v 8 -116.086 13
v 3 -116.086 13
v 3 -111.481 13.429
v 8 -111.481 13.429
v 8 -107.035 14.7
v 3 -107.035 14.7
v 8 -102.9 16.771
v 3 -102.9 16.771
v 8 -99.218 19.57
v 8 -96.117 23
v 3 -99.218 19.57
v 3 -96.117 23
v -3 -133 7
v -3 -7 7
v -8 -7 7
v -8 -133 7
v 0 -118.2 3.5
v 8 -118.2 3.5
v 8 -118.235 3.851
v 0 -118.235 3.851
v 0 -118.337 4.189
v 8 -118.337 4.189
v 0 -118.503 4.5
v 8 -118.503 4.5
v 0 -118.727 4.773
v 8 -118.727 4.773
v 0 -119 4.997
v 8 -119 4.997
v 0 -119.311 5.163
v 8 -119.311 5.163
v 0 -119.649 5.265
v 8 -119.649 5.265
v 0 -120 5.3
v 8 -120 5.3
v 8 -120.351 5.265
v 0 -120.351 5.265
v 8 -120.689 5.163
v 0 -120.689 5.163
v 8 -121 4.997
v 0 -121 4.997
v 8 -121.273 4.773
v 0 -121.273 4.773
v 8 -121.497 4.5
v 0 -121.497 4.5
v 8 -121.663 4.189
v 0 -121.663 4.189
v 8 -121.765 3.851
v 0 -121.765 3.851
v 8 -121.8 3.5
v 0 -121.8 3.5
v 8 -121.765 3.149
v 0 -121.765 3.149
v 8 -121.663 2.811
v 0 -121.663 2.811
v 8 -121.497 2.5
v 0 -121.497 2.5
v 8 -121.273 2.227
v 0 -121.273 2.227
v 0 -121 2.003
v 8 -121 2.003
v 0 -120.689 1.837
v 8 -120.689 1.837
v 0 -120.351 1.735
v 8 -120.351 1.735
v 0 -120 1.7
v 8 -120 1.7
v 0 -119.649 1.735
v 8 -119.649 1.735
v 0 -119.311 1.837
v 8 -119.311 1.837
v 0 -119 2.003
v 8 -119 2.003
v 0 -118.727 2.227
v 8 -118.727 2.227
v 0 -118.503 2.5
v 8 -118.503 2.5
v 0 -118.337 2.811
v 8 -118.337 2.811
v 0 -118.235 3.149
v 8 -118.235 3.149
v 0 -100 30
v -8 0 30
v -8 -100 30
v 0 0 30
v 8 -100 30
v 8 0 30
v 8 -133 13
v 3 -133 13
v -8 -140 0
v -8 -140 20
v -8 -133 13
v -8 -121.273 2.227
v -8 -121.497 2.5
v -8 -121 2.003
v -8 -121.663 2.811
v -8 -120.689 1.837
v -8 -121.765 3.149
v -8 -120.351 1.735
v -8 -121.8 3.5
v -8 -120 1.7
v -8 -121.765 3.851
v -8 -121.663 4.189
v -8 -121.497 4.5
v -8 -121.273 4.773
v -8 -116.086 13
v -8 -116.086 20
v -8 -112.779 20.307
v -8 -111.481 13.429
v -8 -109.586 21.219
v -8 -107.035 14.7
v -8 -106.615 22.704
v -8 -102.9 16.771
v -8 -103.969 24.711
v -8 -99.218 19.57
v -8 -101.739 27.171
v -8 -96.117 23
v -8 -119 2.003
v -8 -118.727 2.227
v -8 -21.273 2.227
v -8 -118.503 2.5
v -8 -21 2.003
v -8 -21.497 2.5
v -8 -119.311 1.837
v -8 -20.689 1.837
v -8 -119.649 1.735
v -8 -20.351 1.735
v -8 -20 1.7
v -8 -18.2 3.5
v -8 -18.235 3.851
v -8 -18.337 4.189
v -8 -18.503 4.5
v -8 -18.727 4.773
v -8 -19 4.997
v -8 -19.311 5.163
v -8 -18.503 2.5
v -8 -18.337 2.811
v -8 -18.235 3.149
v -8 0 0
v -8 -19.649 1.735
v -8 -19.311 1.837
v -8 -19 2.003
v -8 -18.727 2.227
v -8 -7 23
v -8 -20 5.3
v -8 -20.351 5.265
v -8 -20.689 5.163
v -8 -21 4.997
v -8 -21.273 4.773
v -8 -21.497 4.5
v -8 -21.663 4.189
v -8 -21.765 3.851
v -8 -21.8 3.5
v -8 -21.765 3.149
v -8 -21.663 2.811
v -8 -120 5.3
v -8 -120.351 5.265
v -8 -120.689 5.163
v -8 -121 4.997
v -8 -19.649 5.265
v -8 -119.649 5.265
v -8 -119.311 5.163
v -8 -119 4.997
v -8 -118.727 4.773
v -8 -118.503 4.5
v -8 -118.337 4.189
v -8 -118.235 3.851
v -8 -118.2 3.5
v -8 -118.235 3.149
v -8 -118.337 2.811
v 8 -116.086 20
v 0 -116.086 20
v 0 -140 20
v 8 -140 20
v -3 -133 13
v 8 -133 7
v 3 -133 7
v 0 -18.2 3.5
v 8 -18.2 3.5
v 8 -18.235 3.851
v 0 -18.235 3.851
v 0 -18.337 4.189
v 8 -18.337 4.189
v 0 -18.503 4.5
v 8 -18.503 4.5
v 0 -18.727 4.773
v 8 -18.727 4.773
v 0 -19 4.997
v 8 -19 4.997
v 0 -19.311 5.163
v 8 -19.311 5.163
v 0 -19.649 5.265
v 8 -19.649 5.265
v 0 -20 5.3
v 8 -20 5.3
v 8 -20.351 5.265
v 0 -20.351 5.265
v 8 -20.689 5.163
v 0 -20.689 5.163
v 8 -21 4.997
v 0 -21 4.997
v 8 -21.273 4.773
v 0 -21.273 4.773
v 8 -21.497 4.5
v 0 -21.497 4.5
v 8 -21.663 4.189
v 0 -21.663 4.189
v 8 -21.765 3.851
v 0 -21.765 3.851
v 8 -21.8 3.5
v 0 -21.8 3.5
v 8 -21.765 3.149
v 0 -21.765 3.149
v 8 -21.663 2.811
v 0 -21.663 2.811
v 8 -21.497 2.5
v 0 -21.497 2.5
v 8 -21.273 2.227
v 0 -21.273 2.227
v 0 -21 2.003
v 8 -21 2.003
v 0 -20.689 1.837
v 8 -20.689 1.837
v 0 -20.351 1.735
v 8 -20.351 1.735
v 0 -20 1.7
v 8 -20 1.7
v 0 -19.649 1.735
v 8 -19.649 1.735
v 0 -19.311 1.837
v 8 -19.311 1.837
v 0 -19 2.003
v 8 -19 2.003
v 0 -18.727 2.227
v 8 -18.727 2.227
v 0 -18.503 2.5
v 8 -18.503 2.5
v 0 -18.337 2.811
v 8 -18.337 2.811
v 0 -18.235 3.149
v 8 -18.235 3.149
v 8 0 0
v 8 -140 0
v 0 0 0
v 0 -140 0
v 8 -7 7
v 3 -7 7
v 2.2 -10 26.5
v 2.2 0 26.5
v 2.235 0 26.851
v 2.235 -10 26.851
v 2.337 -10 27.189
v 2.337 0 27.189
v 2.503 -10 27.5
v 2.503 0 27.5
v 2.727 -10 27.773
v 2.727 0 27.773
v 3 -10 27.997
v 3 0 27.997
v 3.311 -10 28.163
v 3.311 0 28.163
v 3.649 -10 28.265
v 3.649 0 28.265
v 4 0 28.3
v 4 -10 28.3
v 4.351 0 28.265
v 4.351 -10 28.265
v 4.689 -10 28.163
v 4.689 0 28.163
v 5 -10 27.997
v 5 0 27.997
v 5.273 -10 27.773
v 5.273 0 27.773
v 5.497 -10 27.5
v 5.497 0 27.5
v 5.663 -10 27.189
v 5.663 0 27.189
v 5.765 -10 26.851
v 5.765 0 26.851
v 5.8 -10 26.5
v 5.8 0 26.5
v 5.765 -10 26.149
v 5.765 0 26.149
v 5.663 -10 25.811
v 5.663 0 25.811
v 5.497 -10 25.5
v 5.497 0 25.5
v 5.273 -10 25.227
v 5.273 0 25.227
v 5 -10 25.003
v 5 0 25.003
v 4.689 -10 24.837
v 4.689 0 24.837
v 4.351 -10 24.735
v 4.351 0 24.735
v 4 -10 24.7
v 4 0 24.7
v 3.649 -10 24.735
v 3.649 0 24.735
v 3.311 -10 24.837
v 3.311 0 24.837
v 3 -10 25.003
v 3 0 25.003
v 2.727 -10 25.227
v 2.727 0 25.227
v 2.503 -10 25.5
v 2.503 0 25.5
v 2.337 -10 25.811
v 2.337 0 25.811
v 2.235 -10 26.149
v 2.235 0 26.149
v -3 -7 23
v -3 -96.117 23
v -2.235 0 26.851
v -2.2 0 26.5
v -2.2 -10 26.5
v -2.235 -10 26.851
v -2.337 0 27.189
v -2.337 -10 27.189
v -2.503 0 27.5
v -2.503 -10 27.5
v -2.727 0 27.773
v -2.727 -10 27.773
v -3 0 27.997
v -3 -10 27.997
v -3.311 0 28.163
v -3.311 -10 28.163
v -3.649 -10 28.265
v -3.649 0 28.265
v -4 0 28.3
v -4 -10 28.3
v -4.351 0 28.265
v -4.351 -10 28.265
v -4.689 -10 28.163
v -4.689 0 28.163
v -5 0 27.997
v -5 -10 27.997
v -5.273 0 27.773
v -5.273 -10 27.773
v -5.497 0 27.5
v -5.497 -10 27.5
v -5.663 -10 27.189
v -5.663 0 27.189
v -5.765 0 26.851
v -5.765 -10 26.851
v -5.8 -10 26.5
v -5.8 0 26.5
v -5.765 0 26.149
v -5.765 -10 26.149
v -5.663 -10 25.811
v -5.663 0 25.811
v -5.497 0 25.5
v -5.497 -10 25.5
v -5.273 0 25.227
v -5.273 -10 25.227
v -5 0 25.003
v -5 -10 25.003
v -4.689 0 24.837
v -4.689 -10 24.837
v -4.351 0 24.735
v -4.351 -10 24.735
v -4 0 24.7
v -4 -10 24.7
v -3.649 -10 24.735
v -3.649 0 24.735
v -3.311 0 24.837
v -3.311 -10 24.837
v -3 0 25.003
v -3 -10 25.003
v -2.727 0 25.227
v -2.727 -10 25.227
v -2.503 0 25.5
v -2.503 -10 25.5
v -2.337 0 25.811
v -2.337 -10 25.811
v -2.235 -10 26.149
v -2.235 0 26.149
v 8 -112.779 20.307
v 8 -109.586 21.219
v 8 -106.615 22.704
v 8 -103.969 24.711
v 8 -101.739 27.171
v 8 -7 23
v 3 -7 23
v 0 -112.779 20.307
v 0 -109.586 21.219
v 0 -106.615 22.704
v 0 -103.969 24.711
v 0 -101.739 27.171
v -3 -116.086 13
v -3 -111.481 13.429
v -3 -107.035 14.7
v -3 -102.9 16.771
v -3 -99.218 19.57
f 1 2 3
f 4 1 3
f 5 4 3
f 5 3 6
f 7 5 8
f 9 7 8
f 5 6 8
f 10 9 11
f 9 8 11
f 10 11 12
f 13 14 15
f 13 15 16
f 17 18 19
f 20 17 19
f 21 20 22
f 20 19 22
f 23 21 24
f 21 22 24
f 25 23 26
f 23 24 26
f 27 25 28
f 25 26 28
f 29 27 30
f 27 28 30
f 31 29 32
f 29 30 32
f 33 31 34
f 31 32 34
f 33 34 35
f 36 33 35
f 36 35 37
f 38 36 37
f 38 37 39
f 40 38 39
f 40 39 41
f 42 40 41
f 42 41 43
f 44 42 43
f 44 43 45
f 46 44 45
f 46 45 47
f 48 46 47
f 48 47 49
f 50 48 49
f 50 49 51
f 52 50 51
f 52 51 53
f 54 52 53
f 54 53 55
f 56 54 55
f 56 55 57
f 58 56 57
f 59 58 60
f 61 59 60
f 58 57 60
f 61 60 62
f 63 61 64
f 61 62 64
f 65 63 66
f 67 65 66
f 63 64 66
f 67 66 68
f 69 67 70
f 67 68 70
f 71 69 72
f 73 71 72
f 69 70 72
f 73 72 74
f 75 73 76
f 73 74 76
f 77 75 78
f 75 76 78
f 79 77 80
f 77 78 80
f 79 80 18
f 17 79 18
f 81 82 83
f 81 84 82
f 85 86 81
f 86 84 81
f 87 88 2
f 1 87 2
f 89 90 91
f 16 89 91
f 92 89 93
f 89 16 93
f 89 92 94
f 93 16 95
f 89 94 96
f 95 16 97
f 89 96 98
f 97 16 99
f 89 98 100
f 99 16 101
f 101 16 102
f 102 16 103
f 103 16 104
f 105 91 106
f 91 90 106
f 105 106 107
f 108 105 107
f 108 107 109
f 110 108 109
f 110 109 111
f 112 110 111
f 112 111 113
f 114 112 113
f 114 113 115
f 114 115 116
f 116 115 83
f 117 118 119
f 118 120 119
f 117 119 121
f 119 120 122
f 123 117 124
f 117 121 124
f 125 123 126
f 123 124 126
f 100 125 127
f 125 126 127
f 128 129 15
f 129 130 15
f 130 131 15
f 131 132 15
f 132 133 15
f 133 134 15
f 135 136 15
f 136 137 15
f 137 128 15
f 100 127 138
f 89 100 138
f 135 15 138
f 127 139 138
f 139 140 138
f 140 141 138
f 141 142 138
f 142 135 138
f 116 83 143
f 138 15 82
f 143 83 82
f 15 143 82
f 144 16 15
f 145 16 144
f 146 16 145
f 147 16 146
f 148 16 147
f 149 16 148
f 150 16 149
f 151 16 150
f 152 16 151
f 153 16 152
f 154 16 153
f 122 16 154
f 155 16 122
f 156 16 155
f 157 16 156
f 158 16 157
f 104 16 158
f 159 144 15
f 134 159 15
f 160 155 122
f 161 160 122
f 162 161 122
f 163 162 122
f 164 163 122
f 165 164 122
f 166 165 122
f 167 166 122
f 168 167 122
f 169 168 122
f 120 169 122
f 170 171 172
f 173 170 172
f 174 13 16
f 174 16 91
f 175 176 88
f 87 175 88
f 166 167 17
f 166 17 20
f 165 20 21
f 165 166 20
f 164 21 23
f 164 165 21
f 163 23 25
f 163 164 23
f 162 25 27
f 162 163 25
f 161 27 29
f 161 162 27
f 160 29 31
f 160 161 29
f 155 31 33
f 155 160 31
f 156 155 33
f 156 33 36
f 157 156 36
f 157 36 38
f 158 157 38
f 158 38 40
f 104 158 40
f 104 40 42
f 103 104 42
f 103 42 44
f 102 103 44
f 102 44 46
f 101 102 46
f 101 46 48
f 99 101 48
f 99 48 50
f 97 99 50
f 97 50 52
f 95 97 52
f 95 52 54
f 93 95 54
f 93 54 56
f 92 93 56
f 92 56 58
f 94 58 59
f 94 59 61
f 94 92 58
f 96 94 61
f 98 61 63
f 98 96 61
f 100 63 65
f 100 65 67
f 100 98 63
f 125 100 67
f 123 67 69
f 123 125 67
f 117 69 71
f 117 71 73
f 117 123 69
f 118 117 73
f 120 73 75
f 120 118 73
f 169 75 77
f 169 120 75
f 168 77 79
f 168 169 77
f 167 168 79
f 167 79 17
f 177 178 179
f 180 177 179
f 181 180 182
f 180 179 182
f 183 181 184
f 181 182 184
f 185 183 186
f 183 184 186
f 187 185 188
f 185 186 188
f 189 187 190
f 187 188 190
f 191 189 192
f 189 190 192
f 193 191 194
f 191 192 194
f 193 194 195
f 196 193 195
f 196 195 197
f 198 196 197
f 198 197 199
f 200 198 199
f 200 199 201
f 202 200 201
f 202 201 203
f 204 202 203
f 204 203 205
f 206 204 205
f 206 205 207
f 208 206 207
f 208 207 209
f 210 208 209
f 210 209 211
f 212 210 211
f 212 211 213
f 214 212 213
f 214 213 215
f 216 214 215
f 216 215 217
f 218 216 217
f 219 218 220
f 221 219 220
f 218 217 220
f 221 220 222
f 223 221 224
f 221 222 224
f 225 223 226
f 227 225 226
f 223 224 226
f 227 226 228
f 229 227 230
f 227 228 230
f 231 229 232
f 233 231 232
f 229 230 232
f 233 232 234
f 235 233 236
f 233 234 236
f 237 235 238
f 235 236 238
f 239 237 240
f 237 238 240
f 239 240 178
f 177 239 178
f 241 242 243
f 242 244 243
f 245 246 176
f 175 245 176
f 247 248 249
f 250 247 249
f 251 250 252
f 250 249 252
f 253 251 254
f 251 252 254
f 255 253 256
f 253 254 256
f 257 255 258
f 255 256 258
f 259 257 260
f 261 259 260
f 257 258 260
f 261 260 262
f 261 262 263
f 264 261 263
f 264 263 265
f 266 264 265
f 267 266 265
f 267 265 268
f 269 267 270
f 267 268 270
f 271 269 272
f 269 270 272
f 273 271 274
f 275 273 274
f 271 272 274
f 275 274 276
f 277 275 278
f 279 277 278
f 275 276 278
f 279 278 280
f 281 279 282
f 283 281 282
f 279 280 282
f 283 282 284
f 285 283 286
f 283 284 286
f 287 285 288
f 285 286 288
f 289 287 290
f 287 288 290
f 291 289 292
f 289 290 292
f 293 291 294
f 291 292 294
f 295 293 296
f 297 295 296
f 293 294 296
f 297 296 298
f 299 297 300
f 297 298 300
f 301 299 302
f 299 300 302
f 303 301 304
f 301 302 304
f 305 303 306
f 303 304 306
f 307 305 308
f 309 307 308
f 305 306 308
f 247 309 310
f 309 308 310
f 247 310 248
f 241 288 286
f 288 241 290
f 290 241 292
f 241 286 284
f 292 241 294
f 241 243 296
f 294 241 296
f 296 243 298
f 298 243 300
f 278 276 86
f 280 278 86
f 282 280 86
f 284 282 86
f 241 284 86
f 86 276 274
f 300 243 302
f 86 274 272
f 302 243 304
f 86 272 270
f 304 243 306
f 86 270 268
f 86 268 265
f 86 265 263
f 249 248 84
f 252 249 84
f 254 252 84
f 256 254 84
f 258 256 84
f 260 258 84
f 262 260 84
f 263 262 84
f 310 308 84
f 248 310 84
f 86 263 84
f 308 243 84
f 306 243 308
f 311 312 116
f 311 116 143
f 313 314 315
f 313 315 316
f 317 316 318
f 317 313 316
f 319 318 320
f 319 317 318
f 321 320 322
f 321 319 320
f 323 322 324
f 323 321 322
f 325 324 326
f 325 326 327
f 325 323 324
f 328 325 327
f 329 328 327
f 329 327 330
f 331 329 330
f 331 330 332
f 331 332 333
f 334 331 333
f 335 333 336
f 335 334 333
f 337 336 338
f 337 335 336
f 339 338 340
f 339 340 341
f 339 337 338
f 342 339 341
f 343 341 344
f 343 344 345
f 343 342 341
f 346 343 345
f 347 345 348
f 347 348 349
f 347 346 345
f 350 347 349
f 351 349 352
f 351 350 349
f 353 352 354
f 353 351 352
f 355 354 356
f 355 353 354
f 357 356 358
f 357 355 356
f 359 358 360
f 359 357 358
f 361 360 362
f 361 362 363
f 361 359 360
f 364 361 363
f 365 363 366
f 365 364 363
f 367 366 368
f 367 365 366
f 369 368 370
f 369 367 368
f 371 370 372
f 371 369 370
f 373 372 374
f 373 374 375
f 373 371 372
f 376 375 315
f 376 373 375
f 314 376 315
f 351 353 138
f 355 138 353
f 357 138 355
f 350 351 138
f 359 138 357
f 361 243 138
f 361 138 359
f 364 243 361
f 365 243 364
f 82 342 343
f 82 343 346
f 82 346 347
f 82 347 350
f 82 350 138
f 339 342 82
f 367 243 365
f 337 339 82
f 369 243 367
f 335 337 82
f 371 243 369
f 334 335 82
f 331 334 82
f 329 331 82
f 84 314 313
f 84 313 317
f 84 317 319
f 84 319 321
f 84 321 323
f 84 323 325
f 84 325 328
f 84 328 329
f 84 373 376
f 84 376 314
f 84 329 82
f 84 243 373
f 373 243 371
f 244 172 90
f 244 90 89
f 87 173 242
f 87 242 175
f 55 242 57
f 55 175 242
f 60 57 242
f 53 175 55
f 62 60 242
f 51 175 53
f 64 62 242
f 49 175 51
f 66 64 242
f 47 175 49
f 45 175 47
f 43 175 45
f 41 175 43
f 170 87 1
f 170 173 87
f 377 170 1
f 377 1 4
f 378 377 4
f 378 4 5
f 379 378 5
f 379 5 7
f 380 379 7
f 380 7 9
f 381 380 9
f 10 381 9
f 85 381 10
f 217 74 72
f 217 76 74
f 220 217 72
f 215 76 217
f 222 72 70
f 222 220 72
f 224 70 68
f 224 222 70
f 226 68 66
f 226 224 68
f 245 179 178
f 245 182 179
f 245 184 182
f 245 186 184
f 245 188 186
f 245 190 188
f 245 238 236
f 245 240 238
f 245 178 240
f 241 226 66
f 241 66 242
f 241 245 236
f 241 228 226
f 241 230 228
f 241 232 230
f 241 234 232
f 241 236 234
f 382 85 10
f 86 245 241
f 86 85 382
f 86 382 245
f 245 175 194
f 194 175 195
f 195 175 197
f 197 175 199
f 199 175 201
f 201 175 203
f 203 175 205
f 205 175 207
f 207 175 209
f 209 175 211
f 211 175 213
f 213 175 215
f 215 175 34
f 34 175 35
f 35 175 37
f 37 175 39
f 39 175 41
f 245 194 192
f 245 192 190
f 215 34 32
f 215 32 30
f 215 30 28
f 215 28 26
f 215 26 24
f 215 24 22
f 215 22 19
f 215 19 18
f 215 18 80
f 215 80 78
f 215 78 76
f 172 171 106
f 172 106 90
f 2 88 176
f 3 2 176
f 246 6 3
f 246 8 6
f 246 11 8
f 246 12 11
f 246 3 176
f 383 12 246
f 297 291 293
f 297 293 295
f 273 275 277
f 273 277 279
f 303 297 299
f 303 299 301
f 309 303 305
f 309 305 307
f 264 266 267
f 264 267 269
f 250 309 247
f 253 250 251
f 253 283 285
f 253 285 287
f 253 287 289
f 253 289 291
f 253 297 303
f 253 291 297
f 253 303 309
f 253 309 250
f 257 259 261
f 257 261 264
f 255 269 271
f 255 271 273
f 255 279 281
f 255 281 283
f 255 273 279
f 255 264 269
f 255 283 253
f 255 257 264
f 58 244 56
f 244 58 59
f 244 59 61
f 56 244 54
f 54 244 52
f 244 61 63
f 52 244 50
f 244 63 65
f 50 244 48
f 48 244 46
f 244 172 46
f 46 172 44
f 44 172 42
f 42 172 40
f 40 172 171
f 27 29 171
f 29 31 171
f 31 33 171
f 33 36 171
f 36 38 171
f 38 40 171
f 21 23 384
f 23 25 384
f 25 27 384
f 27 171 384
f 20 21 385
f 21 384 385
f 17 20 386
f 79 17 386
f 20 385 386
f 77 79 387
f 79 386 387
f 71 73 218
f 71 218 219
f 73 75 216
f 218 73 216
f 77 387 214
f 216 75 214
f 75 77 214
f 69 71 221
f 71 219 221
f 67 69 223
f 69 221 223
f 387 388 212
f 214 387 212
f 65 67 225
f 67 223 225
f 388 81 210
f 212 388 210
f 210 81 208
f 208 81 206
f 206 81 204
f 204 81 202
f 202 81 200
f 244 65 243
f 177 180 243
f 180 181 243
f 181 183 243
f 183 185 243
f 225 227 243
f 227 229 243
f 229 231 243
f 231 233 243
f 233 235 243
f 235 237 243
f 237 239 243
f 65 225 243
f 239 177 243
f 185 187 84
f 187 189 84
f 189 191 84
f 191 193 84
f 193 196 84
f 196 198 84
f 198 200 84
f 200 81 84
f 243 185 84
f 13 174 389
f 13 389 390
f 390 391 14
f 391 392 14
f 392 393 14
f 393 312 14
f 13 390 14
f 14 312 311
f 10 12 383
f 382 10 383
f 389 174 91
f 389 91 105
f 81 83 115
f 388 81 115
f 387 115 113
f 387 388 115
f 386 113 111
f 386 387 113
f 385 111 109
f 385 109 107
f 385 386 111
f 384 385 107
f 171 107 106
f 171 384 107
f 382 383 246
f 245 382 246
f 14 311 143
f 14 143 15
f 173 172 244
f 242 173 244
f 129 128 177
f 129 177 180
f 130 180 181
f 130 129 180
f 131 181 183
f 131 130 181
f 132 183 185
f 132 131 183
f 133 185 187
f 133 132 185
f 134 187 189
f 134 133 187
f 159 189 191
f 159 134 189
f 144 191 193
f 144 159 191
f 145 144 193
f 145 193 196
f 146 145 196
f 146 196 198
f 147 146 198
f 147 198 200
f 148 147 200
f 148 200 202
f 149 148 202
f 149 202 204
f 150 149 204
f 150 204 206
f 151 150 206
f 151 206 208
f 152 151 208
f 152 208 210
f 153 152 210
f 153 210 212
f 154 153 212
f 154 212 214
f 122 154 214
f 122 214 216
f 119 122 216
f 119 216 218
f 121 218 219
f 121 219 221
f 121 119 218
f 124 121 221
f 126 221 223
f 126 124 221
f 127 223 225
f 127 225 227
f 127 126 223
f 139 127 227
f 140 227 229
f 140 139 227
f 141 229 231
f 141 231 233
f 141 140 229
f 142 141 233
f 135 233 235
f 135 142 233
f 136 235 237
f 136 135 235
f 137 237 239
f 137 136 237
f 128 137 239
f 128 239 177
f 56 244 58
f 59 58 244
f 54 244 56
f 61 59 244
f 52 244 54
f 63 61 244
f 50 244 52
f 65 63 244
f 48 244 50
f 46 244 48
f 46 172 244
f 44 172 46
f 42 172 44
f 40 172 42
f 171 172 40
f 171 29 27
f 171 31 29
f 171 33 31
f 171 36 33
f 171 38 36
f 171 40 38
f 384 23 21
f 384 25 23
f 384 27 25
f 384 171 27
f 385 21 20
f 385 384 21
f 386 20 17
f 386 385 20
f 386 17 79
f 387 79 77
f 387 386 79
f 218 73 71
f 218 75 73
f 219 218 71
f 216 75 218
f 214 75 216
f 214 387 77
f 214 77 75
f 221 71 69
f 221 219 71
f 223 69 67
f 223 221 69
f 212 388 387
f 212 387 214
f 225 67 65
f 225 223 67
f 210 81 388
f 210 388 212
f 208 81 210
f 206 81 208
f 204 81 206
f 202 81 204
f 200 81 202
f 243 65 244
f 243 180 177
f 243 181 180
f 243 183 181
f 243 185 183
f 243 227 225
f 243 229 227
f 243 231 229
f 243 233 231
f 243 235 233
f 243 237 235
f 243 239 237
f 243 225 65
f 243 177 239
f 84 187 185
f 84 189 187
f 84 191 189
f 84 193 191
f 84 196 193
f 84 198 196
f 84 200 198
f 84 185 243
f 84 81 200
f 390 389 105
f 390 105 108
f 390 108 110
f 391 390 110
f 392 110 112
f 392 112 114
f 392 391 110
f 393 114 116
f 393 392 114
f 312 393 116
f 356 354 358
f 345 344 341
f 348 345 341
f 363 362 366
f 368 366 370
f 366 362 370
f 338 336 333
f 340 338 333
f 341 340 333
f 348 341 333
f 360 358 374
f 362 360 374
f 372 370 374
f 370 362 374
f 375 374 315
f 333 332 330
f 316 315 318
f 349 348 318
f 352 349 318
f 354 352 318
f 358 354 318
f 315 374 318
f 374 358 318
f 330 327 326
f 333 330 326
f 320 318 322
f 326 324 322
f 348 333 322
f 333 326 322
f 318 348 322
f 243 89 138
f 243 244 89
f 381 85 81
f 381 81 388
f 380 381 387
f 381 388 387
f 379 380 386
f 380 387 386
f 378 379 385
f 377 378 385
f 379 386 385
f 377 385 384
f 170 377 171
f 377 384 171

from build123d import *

# Parameters (mm, degrees)
F1_DEPTH = 3
F3_DEPTH = 5
F4_R     = 1.8
F5_DEPTH = 8.001
F6_R     = 1.8
F7_DEPTH = 10


with BuildPart() as f1:
    # F0 (on Right) → F1 (new body)
    with BuildSketch(Plane.YZ):
        with BuildLine():
            Line((-140, 0), (0, 0))
            Line((0, 0), (0, 30))
            Line((0, 30), (-100, 30))
            ThreePointArc((-100, 30), (-106.615398, 22.703773), (-116.085774, 20))
            Line((-116.085774, 20), (-140, 20))
            Line((-140, 20), (-140, 0))
        make_face()
    extrude(amount=F1_DEPTH)

    # F2 (on face) → F3 (join)
    with BuildSketch(Plane.YZ.offset(3)):
        with BuildLine():
            Line((-140, 20), (-140, 0))
            Line((-140, 0), (0, 0))
            Line((0, 0), (0, 30))
            Line((0, 30), (-100, 30))
            ThreePointArc((-100, 30), (-106.615398, 22.703773), (-116.085774, 20))
            Line((-116.085774, 20), (-140, 20))
        make_face()
        with BuildLine():
            Line((-7, 7), (-133, 7))
            Line((-133, 7), (-133, 13))
            Line((-133, 13), (-116.085774, 13))
            ThreePointArc((-116.085774, 13), (-104.919395, 15.63971), (-96.116995, 23))
            Line((-96.116995, 23), (-7, 23))
            Line((-7, 23), (-7, 7))
        make_face(mode=Mode.SUBTRACT)
    extrude(amount=F3_DEPTH)

    # F4 (on face) → F5 (cut, through all)
    with BuildSketch(Plane.YZ.offset(8)):
        with Locations((-20, 3.5)):
            Circle(F4_R)
        with Locations((-120, 3.5)):
            Circle(F4_R)
    extrude(amount=-F5_DEPTH, mode=Mode.SUBTRACT)

    # F6 (on face) → F7 (cut)
    with BuildSketch(Plane(origin=(0, 0, 0), x_dir=(-1, 0, 0), z_dir=(0, 1, 0))):
        with Locations((-4, 26.5)):
            Circle(F6_R)
    extrude(amount=-F7_DEPTH, mode=Mode.SUBTRACT)


with BuildPart() as f8_1:
    # F8: instance of F1
    add(f1.part.mirror(Plane.YZ))


solid = Compound([f1.part, f8_1.part])
